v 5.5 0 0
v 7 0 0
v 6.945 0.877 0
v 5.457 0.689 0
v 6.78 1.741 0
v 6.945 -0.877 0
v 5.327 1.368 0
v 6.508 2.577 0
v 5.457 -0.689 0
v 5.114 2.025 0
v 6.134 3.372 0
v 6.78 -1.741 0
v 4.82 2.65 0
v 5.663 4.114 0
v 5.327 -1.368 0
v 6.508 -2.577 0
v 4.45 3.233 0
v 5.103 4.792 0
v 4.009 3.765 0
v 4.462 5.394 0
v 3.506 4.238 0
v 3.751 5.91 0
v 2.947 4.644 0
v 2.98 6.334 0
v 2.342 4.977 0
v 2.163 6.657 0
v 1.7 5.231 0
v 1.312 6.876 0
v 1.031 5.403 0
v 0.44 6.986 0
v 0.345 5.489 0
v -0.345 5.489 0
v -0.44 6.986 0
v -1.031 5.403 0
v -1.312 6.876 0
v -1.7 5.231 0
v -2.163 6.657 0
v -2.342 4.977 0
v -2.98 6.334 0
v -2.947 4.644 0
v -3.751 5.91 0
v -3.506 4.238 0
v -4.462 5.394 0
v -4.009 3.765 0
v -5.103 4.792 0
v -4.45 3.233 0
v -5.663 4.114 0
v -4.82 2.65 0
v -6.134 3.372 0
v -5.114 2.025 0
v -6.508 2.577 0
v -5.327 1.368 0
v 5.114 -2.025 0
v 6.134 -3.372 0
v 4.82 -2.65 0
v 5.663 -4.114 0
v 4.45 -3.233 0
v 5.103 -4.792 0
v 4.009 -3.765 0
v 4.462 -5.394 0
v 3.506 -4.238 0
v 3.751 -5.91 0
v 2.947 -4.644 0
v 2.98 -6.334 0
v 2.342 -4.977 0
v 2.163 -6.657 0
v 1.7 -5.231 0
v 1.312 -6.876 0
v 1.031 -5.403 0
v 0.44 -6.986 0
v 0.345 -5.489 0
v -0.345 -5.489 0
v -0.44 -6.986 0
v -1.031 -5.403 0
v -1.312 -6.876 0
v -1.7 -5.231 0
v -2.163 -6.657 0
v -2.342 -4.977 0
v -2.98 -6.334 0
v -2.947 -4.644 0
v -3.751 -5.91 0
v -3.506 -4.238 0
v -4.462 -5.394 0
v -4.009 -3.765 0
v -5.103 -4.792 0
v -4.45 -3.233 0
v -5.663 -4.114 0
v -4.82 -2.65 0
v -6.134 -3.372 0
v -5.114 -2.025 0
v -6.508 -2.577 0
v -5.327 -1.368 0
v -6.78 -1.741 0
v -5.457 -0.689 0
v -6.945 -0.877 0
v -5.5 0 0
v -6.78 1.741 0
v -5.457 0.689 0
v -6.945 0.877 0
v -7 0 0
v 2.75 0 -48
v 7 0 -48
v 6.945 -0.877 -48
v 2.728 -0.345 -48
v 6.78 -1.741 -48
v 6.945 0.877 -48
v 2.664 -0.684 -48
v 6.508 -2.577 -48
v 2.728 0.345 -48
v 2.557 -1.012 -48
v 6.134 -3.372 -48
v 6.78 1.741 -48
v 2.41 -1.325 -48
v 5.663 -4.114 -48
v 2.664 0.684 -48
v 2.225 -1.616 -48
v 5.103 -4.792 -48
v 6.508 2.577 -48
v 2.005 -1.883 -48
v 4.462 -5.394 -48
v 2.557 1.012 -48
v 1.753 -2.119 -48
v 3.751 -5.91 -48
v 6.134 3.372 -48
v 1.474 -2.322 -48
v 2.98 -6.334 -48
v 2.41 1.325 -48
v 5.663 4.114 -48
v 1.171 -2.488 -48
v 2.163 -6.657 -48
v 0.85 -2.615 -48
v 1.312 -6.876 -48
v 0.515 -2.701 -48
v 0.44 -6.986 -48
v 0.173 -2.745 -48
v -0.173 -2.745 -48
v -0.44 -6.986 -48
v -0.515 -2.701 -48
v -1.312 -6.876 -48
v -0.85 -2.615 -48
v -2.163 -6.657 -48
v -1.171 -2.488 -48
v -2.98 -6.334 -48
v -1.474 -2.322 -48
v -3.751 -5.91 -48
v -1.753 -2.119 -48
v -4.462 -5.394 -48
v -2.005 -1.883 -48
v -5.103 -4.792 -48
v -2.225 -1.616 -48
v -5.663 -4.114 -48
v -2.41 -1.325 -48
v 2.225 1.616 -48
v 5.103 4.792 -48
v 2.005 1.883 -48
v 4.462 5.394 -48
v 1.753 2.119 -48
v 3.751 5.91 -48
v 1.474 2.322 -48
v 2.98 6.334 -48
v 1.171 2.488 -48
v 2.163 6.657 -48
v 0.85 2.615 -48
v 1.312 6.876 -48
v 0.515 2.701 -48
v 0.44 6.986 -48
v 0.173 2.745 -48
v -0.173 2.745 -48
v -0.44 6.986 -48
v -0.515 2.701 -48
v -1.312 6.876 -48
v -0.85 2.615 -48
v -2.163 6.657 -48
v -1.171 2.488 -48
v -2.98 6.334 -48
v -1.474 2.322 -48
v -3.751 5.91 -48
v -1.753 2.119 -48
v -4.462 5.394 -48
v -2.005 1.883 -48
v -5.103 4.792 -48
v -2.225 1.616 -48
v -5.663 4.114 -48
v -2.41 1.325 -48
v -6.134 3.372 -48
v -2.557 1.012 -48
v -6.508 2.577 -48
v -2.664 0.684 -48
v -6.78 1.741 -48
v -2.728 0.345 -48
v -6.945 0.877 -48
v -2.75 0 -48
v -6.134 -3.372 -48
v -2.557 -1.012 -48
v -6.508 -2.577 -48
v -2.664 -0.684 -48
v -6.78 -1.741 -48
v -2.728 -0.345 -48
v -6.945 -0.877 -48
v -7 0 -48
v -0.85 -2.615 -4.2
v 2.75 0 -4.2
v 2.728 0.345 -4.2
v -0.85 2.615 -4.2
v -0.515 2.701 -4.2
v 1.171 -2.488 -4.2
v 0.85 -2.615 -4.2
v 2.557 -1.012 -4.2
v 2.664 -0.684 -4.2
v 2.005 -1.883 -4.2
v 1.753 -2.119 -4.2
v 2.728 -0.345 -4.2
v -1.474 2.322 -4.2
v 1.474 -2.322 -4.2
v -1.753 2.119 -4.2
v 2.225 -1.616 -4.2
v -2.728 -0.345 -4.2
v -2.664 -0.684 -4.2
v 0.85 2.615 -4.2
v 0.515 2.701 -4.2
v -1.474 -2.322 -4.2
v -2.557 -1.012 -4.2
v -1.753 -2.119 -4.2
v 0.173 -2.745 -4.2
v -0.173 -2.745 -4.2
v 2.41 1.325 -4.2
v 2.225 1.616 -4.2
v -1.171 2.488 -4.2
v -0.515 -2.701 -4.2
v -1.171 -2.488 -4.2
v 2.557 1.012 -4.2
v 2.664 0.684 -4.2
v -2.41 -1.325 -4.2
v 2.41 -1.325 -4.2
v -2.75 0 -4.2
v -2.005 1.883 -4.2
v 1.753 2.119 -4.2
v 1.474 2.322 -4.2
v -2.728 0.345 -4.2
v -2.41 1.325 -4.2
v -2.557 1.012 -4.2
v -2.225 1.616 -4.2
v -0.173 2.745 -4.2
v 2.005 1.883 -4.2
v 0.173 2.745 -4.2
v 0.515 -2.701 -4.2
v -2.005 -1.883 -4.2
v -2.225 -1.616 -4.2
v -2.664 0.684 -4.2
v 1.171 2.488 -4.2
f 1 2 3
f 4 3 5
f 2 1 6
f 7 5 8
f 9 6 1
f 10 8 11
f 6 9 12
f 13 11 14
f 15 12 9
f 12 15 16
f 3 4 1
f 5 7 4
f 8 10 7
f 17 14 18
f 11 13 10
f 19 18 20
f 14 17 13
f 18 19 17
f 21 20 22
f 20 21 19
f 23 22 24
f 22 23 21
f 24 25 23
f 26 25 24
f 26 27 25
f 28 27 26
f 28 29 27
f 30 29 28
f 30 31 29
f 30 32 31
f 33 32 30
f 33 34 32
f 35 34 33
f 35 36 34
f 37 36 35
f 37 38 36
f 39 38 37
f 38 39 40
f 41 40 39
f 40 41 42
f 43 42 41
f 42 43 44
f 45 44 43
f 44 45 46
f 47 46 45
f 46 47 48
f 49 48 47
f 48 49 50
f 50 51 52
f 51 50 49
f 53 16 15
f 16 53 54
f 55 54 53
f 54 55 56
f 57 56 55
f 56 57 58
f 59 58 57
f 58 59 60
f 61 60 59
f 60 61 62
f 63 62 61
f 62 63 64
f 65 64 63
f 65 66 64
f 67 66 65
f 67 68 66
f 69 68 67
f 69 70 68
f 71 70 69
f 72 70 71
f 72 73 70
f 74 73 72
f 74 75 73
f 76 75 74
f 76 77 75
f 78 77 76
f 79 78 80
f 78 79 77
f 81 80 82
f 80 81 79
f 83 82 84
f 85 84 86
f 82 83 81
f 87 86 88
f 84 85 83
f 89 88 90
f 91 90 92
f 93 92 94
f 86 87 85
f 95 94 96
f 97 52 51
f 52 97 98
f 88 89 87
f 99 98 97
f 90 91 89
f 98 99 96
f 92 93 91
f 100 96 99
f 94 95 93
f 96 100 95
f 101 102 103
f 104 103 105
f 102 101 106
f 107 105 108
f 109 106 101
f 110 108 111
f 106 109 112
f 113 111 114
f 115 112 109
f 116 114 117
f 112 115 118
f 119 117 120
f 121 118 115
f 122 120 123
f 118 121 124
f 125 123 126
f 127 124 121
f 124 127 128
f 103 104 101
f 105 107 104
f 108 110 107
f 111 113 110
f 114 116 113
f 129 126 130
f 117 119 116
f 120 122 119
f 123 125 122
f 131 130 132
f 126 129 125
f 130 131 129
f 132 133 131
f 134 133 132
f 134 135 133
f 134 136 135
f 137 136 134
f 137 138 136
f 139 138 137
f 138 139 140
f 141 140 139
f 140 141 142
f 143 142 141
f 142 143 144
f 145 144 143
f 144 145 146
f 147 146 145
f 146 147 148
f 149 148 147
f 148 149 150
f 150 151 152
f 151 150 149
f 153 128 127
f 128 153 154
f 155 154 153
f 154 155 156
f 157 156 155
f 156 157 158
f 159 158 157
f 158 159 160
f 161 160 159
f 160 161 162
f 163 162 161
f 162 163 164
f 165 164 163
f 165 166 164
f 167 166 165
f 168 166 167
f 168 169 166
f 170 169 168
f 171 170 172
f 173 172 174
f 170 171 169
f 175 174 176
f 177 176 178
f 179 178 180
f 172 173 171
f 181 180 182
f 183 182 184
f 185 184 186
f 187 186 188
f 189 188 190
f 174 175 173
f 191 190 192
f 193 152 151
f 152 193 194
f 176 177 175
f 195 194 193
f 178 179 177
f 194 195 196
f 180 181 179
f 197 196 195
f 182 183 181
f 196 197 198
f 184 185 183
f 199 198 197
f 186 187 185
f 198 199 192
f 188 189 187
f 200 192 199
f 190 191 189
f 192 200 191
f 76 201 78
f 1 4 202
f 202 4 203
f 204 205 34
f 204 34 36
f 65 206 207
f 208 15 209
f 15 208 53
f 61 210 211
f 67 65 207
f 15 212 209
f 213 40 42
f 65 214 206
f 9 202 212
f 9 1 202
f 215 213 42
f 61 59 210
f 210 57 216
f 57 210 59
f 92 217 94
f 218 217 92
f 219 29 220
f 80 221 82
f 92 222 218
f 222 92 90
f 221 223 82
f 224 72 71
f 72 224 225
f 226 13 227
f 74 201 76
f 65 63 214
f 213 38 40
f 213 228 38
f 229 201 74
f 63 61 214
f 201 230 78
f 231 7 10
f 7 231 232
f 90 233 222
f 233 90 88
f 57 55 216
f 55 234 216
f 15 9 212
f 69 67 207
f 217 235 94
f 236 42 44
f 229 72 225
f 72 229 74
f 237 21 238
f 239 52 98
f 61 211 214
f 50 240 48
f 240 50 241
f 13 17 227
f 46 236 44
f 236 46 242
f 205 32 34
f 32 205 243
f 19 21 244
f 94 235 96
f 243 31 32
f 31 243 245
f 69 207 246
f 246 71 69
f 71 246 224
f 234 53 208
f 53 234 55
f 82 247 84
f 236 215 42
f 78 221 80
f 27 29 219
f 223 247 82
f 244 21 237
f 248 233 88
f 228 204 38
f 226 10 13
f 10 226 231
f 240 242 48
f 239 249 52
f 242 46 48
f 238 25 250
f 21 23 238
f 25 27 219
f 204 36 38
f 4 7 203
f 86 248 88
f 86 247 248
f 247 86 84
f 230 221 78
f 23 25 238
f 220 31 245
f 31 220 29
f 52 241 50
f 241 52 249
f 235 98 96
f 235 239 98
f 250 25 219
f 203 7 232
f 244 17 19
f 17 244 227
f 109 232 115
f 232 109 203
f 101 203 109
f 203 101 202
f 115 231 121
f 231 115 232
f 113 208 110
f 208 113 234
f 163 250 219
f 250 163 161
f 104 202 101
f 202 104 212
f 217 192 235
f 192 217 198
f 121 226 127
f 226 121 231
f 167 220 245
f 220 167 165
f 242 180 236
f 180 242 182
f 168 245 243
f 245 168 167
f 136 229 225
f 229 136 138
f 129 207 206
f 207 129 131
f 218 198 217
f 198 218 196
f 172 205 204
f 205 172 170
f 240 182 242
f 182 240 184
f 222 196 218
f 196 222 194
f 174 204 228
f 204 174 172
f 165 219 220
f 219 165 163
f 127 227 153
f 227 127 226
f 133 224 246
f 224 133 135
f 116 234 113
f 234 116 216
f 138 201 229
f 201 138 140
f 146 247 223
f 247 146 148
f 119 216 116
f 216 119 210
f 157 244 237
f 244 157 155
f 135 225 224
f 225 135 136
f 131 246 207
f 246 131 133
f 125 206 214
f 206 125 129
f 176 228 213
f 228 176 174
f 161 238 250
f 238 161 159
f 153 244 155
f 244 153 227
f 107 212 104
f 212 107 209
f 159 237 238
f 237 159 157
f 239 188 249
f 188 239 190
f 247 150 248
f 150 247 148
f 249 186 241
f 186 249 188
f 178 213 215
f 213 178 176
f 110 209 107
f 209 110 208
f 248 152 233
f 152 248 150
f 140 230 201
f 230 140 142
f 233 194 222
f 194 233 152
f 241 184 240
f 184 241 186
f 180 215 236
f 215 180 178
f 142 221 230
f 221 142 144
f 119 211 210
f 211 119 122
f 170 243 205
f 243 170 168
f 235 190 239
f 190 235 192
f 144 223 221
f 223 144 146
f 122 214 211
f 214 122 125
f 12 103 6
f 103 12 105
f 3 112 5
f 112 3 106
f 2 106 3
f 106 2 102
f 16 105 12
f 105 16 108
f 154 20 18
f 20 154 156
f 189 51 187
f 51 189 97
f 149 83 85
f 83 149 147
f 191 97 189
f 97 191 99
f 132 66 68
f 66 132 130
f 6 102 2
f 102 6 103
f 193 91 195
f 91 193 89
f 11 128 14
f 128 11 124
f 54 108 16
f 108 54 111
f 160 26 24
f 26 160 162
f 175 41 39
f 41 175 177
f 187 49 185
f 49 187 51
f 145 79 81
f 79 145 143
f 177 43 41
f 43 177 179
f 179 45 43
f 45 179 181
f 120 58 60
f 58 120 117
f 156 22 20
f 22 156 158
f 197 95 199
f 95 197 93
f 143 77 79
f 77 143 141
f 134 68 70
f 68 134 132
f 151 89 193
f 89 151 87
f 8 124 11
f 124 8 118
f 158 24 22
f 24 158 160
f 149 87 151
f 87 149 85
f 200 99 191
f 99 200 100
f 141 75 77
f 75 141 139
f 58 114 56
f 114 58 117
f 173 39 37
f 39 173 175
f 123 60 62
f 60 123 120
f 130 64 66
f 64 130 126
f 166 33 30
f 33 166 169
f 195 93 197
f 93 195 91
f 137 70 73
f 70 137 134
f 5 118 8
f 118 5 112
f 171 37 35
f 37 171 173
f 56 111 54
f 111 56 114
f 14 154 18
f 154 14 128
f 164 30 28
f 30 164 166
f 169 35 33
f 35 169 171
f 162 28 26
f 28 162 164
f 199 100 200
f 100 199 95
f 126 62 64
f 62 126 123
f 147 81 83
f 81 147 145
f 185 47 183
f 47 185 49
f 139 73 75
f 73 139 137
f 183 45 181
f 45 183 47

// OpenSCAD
$fn = 50;


difference() {
	union() {
		translate(v = [0, 0, -48.0000000000]) {
			cylinder(h = 48, r = 7.0000000000);
		}
		cylinder(h = 0, r = 16.0000000000);
	}
	union() {
		translate(v = [0, 0, 0]) {
			rotate(a = [0, 0, 0]) {
				difference() {
					union() {
						#translate(v = [0, 0, -48.0000000000]) {
							cylinder(h = 48, r = 2.2500000000);
						}
						#translate(v = [0, 0, -4.2000000000]) {
							cylinder(h = 4.2000000000, r = 7.0000000000, r1 = 2.7500000000, r2 = 5.5000000000);
						}
						#translate(v = [0, 0, -48.0000000000]) {
							cylinder(h = 48, r = 2.7500000000);
						}
						#translate(v = [0, 0, -48.0000000000]) {
							cylinder(h = 48, r = 2.2500000000);
						}
					}
					union();
				}
			}
		}
	}
}
